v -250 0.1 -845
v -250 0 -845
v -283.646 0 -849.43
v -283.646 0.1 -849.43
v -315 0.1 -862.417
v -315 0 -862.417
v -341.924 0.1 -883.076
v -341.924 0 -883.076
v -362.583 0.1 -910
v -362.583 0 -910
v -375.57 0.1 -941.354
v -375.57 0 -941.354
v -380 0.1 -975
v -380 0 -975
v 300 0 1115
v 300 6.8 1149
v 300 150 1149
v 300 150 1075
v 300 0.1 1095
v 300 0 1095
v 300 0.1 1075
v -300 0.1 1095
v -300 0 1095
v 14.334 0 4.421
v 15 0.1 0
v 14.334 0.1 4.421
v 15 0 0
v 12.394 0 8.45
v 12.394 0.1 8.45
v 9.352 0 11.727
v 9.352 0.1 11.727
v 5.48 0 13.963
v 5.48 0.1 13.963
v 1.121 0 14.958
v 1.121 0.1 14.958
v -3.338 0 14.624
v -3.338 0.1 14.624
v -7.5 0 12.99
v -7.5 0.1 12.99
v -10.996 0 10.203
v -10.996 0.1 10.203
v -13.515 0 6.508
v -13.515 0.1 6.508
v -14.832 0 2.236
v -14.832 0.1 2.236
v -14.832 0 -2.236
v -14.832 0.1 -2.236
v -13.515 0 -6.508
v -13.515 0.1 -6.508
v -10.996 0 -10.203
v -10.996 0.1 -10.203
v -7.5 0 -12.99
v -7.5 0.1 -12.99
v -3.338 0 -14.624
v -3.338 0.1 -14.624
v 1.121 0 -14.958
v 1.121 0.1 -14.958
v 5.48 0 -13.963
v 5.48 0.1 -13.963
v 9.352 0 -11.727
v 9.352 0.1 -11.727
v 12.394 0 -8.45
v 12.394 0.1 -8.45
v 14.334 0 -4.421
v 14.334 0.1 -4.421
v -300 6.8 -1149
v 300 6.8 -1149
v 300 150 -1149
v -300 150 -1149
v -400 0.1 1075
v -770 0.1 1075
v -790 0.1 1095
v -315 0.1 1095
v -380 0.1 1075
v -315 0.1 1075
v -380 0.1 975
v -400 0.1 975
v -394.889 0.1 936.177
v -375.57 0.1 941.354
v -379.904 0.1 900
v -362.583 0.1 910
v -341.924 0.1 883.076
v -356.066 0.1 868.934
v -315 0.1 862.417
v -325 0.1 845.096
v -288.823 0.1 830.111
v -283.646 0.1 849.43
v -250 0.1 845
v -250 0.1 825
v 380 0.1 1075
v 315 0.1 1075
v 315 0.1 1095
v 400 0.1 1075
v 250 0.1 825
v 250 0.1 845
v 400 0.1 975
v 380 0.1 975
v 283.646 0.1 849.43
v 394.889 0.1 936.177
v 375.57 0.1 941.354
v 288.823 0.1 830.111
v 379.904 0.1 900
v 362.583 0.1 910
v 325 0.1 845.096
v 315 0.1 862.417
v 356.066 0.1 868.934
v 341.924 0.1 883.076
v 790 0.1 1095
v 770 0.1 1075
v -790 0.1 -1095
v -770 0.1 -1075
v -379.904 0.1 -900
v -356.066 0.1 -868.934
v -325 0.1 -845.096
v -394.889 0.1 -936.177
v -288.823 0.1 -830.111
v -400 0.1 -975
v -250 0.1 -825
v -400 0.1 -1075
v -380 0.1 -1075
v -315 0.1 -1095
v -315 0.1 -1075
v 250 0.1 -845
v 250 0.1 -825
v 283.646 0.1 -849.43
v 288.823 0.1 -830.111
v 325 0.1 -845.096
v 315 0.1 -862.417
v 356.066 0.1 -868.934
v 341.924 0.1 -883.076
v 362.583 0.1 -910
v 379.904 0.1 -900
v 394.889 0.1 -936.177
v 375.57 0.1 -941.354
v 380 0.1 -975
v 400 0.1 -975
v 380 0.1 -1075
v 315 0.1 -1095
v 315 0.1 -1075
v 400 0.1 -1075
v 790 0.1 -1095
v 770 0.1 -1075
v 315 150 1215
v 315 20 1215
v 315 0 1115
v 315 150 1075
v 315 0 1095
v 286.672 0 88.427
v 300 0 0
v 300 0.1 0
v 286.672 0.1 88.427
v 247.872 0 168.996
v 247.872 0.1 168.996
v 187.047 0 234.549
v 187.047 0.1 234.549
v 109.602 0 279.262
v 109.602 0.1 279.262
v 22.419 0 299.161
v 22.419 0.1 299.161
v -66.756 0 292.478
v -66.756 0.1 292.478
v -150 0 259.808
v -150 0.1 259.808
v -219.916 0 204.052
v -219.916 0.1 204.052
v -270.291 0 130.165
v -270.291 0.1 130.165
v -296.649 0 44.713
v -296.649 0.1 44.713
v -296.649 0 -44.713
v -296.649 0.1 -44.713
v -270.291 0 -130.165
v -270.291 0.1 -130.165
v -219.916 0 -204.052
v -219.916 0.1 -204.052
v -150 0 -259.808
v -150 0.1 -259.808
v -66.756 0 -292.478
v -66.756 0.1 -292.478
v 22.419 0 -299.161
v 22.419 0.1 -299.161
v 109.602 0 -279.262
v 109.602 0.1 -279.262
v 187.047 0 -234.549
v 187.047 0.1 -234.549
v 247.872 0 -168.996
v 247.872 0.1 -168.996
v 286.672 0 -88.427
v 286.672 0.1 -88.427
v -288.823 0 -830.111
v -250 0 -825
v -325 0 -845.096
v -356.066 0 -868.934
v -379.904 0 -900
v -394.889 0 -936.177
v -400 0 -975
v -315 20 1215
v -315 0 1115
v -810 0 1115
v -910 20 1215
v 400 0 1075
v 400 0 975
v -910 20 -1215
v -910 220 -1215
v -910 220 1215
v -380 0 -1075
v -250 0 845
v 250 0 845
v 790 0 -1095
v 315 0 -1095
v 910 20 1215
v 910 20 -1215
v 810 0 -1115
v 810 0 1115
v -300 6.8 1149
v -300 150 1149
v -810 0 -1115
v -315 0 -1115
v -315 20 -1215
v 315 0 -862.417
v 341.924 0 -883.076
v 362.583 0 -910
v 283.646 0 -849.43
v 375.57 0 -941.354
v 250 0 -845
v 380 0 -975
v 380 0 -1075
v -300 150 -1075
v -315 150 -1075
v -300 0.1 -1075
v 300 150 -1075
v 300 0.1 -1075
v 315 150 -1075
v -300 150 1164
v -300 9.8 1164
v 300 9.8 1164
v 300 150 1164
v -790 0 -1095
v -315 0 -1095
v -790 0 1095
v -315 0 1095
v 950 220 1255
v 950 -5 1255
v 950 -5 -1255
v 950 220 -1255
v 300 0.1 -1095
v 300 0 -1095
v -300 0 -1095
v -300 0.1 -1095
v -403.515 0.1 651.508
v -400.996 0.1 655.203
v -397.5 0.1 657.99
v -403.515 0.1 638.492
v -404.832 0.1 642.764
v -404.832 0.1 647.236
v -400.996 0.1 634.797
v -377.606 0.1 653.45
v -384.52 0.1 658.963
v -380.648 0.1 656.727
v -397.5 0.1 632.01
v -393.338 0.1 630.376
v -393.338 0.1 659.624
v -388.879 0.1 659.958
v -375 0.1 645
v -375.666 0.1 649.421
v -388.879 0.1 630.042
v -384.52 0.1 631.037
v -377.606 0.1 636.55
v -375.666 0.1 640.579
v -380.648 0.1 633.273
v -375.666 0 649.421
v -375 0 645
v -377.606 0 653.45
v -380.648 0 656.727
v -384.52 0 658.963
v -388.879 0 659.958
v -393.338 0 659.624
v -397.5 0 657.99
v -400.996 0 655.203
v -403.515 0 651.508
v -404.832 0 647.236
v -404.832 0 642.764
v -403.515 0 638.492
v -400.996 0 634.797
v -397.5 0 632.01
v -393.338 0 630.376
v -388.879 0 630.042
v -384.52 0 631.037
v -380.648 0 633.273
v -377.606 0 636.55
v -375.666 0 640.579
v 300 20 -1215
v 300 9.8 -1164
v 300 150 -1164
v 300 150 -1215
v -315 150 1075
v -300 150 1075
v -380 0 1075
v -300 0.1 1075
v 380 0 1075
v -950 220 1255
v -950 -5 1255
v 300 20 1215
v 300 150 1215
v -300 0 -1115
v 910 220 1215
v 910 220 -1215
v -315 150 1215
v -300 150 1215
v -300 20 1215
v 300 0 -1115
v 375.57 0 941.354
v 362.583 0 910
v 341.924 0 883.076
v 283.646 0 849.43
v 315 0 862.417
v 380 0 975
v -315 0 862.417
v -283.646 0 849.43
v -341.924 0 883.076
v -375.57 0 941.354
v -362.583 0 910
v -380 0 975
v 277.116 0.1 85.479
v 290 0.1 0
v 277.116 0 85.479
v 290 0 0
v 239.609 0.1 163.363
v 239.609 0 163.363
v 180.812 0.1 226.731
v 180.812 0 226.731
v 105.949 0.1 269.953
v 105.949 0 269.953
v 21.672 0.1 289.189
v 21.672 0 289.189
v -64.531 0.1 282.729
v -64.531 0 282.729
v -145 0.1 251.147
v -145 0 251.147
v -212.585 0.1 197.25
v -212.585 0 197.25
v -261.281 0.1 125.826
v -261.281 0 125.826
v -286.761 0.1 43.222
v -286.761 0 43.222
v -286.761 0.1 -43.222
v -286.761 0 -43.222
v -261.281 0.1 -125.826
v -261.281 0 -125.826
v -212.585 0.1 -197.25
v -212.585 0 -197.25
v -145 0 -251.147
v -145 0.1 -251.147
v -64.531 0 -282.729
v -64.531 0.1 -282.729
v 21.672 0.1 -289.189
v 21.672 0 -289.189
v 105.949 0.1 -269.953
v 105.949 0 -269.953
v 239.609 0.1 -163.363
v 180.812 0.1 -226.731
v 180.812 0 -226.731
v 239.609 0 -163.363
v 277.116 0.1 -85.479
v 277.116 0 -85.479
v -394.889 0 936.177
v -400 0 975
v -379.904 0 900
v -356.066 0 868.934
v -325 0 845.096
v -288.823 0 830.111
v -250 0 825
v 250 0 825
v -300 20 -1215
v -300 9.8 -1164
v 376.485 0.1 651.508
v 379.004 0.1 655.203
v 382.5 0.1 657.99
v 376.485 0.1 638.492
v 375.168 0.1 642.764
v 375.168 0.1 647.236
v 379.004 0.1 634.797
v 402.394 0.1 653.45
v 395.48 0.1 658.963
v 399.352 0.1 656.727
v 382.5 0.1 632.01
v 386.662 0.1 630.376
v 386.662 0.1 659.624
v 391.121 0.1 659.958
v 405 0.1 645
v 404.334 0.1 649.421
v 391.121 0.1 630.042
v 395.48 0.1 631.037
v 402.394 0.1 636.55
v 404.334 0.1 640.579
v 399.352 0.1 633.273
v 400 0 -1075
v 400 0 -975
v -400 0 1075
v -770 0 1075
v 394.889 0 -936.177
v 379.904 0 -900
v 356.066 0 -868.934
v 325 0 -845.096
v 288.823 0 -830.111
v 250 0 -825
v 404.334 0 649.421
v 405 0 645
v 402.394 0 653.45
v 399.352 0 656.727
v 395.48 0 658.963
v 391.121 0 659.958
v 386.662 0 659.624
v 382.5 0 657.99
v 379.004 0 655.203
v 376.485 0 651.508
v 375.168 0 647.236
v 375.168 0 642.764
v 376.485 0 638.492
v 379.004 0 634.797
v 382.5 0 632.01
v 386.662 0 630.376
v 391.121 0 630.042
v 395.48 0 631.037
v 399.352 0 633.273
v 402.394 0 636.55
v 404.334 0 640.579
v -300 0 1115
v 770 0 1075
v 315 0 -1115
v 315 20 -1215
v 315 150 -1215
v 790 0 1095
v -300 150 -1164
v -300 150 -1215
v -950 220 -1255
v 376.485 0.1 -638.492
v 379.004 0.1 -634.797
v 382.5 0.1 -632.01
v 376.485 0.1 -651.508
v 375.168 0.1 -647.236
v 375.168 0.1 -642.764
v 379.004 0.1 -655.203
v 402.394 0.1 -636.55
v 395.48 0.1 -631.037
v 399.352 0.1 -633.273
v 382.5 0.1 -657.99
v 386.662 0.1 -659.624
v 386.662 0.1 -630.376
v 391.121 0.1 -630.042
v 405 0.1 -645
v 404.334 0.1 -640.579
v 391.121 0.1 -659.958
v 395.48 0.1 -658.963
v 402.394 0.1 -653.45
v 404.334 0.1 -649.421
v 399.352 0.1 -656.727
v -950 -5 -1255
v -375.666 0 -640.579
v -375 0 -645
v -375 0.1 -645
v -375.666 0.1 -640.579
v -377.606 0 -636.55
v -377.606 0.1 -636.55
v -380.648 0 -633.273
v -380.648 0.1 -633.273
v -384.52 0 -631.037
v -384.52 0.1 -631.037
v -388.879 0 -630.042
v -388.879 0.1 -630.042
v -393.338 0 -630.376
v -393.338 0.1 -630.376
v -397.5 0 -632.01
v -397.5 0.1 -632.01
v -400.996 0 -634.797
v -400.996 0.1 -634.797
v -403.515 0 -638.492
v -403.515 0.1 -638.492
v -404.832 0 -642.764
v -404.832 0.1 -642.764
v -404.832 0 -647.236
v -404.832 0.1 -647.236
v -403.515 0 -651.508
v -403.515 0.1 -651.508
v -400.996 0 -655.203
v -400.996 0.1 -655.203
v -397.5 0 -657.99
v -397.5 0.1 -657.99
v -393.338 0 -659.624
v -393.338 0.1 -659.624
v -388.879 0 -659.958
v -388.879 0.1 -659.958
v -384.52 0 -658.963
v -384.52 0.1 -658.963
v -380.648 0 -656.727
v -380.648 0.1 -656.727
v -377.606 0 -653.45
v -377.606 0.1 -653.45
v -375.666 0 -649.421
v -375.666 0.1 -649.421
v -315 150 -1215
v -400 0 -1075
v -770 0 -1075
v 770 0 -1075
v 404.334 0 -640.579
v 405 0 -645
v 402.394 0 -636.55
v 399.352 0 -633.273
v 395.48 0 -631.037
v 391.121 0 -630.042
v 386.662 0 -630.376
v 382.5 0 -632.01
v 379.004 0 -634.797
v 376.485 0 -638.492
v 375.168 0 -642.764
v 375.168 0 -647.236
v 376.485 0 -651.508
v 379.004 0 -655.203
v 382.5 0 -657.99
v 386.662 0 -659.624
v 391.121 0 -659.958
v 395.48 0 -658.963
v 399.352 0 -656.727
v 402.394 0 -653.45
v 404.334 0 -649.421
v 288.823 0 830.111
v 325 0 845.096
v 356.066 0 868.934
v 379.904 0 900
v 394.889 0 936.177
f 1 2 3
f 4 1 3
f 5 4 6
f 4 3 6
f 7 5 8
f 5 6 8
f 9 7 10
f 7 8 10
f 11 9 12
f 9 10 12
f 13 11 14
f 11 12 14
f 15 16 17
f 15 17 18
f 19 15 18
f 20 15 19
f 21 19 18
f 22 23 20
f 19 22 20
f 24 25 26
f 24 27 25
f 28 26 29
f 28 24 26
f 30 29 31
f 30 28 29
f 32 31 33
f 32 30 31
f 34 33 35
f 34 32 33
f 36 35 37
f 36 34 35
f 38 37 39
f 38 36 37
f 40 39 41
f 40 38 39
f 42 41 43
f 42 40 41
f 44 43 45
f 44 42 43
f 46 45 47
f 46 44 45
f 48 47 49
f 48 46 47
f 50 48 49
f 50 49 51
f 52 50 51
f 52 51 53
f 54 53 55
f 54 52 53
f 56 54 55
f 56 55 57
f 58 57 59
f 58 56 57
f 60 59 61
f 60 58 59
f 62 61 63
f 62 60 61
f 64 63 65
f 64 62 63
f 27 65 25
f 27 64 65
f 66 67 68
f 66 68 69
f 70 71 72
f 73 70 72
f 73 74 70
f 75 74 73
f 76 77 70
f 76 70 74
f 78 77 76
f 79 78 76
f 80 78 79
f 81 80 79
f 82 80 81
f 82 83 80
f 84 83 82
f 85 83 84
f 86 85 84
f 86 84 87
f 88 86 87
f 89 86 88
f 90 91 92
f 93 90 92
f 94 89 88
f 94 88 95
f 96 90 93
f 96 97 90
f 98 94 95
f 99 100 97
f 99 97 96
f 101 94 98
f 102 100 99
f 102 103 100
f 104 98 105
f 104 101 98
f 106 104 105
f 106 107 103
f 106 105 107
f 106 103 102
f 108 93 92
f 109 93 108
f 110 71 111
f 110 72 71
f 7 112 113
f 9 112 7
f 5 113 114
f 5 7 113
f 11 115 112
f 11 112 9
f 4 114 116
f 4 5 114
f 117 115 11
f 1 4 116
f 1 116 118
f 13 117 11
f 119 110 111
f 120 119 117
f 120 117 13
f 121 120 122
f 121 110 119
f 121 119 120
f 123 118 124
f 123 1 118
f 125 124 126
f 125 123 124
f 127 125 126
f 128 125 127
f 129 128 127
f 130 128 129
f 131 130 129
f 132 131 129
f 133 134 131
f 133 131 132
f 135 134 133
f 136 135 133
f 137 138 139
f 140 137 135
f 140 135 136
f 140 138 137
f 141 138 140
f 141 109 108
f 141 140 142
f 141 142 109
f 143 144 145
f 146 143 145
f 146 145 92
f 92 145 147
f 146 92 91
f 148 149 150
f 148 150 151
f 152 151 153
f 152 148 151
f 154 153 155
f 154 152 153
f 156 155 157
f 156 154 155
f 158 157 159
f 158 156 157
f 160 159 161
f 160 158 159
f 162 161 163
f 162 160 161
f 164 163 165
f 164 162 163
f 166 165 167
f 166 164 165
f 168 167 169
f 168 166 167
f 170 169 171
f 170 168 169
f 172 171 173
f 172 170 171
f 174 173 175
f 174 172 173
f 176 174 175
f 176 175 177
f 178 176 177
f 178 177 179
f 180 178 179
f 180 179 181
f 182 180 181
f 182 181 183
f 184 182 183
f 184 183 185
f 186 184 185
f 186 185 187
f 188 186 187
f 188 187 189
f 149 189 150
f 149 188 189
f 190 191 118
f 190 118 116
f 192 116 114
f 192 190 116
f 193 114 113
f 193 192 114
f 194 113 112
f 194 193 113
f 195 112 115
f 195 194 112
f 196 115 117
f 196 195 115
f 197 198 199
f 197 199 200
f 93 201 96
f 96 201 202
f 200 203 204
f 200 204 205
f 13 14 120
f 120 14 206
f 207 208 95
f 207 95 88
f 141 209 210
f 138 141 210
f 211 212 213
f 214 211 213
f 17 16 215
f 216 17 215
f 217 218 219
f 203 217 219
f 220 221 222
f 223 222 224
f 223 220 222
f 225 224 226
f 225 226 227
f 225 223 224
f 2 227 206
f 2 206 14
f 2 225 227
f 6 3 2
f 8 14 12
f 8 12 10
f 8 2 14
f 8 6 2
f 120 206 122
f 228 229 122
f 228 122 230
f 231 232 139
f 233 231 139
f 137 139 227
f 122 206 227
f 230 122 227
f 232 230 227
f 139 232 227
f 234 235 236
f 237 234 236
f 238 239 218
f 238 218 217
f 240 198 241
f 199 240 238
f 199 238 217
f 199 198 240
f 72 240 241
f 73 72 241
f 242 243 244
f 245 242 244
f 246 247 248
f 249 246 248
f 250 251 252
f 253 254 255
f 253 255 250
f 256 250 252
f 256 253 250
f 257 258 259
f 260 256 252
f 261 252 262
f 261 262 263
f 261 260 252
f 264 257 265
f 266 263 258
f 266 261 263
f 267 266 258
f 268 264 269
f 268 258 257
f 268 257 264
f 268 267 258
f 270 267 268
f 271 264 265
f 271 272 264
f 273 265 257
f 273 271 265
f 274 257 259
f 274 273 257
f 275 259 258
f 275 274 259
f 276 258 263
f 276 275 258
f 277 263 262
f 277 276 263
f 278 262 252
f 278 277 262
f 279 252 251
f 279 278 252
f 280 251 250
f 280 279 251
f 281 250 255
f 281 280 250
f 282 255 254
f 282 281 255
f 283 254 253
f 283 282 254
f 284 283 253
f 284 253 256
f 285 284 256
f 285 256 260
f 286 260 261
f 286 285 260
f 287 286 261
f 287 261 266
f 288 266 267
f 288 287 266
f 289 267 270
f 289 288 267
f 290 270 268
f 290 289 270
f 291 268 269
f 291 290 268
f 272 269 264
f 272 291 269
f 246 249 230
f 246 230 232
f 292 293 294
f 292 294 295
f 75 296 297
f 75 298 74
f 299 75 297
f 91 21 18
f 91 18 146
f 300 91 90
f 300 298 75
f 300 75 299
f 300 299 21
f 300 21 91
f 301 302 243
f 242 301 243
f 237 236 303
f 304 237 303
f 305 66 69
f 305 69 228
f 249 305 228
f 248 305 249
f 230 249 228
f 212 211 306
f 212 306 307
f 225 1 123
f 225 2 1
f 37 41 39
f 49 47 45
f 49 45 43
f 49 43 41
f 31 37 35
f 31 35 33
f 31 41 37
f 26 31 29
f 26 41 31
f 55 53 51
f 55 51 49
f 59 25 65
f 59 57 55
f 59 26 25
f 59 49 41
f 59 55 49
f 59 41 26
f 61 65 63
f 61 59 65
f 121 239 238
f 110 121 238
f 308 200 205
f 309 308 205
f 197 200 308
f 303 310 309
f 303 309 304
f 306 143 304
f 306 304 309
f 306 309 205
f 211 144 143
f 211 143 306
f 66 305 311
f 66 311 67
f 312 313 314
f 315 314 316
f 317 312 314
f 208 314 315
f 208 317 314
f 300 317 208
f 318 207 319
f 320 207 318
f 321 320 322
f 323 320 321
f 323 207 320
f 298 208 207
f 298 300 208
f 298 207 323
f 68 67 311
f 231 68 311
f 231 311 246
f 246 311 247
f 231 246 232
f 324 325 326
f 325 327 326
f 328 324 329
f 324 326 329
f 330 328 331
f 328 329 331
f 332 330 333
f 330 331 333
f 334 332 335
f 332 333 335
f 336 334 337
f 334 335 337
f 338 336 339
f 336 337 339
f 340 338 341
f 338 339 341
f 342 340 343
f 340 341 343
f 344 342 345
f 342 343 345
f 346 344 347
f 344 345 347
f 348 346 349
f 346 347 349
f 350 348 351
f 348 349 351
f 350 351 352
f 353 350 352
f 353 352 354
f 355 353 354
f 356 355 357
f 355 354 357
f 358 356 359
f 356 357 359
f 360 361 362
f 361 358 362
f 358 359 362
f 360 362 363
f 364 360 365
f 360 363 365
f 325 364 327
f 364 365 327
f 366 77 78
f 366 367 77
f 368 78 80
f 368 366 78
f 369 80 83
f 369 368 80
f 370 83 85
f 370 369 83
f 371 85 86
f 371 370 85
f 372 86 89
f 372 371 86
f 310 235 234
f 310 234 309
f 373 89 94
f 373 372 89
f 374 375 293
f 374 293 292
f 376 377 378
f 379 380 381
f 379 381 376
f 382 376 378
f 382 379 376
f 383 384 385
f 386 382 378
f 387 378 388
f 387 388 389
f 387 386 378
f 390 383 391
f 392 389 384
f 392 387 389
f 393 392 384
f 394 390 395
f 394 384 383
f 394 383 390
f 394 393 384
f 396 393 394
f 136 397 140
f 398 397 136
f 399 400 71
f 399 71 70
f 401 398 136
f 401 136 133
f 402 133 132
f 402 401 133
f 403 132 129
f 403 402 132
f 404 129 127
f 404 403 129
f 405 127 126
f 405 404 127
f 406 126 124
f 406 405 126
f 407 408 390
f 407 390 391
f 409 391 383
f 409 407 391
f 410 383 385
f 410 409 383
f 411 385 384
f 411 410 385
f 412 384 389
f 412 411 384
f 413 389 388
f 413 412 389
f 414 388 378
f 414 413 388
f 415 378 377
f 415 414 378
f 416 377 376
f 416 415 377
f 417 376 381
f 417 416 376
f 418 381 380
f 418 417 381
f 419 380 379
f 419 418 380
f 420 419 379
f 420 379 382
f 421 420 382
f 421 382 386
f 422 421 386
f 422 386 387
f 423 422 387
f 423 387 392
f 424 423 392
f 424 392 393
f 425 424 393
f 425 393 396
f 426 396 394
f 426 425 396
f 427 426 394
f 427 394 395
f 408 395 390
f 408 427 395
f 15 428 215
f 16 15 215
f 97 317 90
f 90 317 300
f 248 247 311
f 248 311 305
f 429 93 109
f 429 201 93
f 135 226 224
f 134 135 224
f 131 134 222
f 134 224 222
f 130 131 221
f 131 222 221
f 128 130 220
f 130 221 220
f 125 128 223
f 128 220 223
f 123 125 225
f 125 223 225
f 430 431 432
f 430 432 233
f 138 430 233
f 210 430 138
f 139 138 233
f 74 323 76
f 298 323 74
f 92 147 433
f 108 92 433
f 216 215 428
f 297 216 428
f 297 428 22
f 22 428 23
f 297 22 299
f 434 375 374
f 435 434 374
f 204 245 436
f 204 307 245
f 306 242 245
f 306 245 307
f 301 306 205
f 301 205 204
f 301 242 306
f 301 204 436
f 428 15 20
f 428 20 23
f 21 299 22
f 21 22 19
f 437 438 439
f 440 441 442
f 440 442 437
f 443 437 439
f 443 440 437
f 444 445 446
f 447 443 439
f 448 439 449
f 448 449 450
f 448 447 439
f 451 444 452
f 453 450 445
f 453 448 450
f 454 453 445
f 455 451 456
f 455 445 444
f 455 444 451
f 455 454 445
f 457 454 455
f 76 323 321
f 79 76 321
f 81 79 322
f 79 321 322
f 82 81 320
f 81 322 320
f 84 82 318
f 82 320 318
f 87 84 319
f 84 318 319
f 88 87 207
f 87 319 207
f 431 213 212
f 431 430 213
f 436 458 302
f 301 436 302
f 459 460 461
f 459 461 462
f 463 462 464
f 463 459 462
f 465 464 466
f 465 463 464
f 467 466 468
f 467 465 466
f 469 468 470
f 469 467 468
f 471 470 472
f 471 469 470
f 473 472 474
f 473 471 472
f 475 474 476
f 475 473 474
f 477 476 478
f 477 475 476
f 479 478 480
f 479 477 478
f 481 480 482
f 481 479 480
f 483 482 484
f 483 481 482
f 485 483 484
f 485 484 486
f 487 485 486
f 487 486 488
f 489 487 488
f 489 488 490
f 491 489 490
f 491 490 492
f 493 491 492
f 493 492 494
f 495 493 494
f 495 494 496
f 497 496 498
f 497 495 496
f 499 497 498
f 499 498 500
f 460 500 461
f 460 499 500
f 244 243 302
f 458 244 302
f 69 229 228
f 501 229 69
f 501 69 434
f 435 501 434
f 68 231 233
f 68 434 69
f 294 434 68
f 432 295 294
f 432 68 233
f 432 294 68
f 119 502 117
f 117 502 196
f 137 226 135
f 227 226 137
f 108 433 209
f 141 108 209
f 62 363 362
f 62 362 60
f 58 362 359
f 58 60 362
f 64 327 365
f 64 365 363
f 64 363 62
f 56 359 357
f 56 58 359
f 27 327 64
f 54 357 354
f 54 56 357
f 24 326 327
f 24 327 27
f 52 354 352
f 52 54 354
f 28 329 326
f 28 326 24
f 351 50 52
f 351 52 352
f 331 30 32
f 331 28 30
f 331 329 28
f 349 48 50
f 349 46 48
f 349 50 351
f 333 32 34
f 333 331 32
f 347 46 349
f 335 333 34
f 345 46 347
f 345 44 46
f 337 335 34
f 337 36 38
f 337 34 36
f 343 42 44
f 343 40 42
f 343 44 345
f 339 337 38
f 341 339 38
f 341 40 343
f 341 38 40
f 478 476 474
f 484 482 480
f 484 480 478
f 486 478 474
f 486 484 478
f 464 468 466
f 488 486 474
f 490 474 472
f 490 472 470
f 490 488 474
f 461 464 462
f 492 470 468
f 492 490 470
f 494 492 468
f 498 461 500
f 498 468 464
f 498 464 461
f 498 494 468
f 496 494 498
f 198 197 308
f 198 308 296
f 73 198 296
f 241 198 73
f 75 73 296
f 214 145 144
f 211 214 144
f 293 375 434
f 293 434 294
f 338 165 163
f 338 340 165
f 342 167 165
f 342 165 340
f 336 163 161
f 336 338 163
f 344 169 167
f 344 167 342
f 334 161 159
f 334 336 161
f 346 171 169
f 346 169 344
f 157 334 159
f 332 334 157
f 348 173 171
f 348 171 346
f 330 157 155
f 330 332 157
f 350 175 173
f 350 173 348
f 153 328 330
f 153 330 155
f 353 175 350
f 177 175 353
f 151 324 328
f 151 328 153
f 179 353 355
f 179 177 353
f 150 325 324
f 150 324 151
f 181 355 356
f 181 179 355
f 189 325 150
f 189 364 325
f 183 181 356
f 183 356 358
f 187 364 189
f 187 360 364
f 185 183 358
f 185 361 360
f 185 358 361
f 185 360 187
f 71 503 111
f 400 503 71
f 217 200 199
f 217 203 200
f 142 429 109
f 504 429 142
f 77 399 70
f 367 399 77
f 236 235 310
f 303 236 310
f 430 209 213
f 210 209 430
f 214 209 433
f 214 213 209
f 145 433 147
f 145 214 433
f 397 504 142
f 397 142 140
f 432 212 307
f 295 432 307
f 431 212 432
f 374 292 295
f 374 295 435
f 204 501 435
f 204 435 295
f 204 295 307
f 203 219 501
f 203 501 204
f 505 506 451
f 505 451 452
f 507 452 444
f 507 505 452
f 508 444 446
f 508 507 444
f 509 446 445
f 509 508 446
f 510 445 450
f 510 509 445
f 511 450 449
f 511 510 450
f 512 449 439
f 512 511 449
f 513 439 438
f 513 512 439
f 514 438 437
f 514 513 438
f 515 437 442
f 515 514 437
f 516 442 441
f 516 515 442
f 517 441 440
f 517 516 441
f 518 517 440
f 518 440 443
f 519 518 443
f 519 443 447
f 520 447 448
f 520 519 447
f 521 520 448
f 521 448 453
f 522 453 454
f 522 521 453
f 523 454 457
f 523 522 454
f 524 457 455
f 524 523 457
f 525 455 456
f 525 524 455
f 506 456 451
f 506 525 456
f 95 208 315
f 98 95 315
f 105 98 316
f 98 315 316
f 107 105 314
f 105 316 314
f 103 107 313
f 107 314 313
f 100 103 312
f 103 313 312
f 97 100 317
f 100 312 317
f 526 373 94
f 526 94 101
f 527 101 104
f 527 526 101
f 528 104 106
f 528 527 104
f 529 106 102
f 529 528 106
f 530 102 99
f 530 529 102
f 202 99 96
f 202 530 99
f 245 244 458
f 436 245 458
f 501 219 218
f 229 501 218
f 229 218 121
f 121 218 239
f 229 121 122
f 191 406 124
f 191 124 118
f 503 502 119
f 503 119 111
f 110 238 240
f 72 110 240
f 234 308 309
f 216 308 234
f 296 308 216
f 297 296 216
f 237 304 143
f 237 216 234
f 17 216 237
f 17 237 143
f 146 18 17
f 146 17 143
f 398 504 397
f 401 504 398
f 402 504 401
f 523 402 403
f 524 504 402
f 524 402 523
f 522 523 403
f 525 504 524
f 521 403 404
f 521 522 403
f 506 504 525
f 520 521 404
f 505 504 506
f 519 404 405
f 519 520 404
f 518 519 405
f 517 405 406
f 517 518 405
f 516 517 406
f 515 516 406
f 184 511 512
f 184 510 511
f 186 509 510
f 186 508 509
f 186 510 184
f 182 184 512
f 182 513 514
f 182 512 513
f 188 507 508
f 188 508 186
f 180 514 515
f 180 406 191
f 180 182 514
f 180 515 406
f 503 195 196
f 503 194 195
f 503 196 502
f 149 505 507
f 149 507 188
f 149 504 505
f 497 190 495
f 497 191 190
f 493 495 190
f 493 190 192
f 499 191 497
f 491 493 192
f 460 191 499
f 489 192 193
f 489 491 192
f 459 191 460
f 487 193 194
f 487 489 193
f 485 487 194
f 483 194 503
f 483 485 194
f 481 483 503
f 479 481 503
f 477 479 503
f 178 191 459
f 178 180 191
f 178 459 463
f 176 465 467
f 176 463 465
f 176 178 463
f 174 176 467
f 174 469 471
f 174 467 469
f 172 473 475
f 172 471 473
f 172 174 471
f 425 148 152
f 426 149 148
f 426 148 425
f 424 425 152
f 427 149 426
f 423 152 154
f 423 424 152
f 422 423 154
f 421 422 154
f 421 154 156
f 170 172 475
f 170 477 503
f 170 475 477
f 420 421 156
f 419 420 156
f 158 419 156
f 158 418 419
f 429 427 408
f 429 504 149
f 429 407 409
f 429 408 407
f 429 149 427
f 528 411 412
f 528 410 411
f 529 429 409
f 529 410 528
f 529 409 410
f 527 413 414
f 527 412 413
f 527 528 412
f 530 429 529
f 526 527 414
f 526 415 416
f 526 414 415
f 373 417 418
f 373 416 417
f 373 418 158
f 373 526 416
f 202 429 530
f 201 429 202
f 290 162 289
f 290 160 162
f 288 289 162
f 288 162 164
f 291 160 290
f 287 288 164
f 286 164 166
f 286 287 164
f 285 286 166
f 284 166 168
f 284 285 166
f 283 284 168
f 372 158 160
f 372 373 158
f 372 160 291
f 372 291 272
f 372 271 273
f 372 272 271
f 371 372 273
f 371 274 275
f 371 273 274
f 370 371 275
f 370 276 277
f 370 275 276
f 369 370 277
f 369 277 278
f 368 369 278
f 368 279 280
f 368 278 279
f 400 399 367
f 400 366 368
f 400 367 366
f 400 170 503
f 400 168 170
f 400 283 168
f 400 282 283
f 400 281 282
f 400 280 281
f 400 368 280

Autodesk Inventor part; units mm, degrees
ref_plane "YZ Plane" through (0, 0, 0) normal (1, 0, 0) x (0, 1, 0)
ref_plane "XZ Plane" through (0, 0, 0) normal (0, 1, 0) x (-1, 0, 0)
ref_plane "XY Plane" through (0, 0, 0) normal (0, 0, 1) x (1, 0, 0)
sketch "Эскиз1" plane through (0, 0, 0) normal (0, 1, 0) x (-1, 0, 0)
  line L0 (910, 1215) -> (-910, 1215)
  line L1 (-910, 1215) -> (-910, -1215)
  line L2 (-910, -1215) -> (910, -1215)
  line L3 (910, -1215) -> (910, 1215)
  line L4 (0, 0) -> (0, -1215) construction
  line L5 (0, 0) -> (910, 0) construction
  line L6 (950, 1255) -> (-950, 1255)
  line L7 (-950, 1255) -> (-950, -1255)
  line L8 (-950, -1255) -> (950, -1255)
  line L9 (950, -1255) -> (950, 1255)
  dimension "d0" = 2430
  dimension "d1" = 1820
  dimension "d2" = 40
  dimension "d3" = 40
extrude "Выдавливание1" add sketch "Эскиз1" along normal blind 220
extrude "Выдавливание2" add sketch "Эскиз1" against normal blind 5 contours L3 L2 L1 L0 | L9 L8 L7 L6
sketch "Эскиз2" plane through (-910, 220, -1215) normal (0, 0, 1) x (1, 0, 0)
  line L0 (-40, -225) -> (-40, 0) construction
  line L1 (1860, 0) -> (-40, 0) construction
  line L2 (1860, 0) -> (1860, -225) construction
  line L3 (-40, -225) -> (1860, -225) construction
  line L4 (0, -220) -> (0, 0) construction
  line L5 (1860, 0) -> (-40, 0) construction
  line L6 (-40, 0) -> (1860, 0) construction
  line L7 (0, 0) -> (1820, 0) construction
  line L8 (1820, 0) -> (0, 0) construction
  line L9 (0, -220) -> (100, -220)
  line L10 (0, -220) -> (0, -200)
  line L11 (0, -200) -> (100, -220)
  line L12 (1820, -220) -> (1820, 0) construction
  line L13 (910, -220) -> (910, 0) construction
  line L14 (1820, -220) -> (1720, -220)
  line L15 (1820, -220) -> (1820, -200)
  line L16 (1820, -200) -> (1720, -220)
  point P0 (910, -220)
  dimension "d8" = 100
  dimension "d9" = 20
extrude "Выдавливание3" add sketch "Эскиз2" along normal blind 2430
sketch "Эскиз3" plane through (-910, 220, 1215) normal (1, 0, 0) x (0, 0, -1)
  line L0 (2430, -200) -> (2430, 0) construction
  line L1 (0, -200) -> (0, 0) construction
  line L2 (0, -200) -> (2430, -200) construction
  line L3 (2430, -200) -> (2430, 0) construction
  line L4 (0, 0) -> (2430, 0) construction
  line L5 (0, -200) -> (0, 0) construction
  line L6 (1215, -220) -> (1215, 0) construction
  line L7 (2470, 0) -> (-40, 0) projected
  line L8 (0, -220) -> (100, -220)
  line L9 (100, -220) -> (0, -200)
  line L10 (0, -200) -> (0, -220)
  line L11 (2430, -220) -> (2330, -220)
  line L12 (2330, -220) -> (2430, -200)
  line L13 (2430, -200) -> (2430, -220)
  dimension "d14" = 100
  dimension "d15" = 20
extrude "Выдавливание4" add sketch "Эскиз3" along normal blind 1820
sketch "Эскиз4" plane through (0, 0, 0) normal (0, 1, 0) x (1, 0, 0)
  line L0 (-790, -1095) -> (790, -1095)
  line L1 (790, -1095) -> (790, 1095)
  line L2 (790, 1095) -> (-790, 1095)
  line L3 (-790, 1095) -> (-790, -1095)
  line L4 (0, 0) -> (0, 1215) construction
  line L5 (0, 0) -> (-910, 0) construction
  line L6 (810, -1115) -> (910, -1215) construction
  line L7 (-810, -1115) -> (810, -1115) construction
  line L8 (-910, -1215) -> (-810, -1115) construction
  line L9 (910, -1215) -> (-910, -1215) construction
  line L10 (-810, 1115) -> (-910, 1215) construction
  line L11 (-910, -1215) -> (-910, 1215) construction
  line L12 (-910, -1215) -> (-810, -1115) construction
  line L13 (-810, 1115) -> (-810, -1115) construction
  line L14 (910, 1215) -> (810, 1115) construction
  line L15 (-910, 1215) -> (910, 1215) construction
  line L16 (-810, 1115) -> (-910, 1215) construction
  line L17 (810, 1115) -> (-810, 1115) construction
  line L18 (910, 1215) -> (810, 1115) construction
  line L19 (810, -1115) -> (810, 1115) construction
  line L20 (810, -1115) -> (910, -1215) construction
  line L21 (910, 1215) -> (910, -1215) construction
  line L22 (810, 1115) -> (-810, 1115) construction
  line L23 (-810, 1115) -> (-810, -1115) construction
  line L24 (-810, -1115) -> (810, -1115) construction
  line L25 (810, -1115) -> (810, 1115) construction
  line L26 (-770, -1075) -> (770, -1075)
  line L27 (770, -1075) -> (770, 1075)
  line L28 (770, 1075) -> (-770, 1075)
  line L29 (-770, 1075) -> (-770, -1075)
  line L30 (-400, -1075) -> (400, -1075) construction
  line L31 (-400, -1075) -> (-400, -975)
  line L32 (-400, -825) -> (400, -825) construction
  line L33 (400, -825) -> (400, -1075) construction
  arc A0 (-400, -975) -> (-250, -825) centre (-250, -975) ccw construction
  arc A1 (-380, -975) -> (-250, -845) centre (-250, -975) ccw construction
  line L34 (-380, -975) -> (-380, -1075)
  line L35 (-250, -845) -> (0, -845)
  arc A2 (-250, -845) -> (-380, -975) centre (-250, -975) ccw
  arc A3 (-250, -825) -> (-400, -975) centre (-250, -975) ccw
  line L36 (-400, -975) -> (-400, -825) construction
  line L37 (-250, -825) -> (0, -825)
  line L38 (400, -1075) -> (400, -975)
  line L39 (380, -975) -> (380, -1075)
  line L40 (250, -845) -> (0, -845)
  arc A4 (380, -975) -> (250, -845) centre (250, -975) ccw
  arc A5 (400, -975) -> (250, -825) centre (250, -975) ccw
  line L41 (250, -825) -> (0, -825)
  line L42 (-400, 1075) -> (-400, 975)
  line L43 (-380, 975) -> (-380, 1075)
  line L44 (-250, 845) -> (0, 845)
  arc A6 (-380, 975) -> (-250, 845) centre (-250, 975) ccw
  arc A7 (-400, 975) -> (-250, 825) centre (-250, 975) ccw
  line L45 (-250, 825) -> (0, 825)
  line L46 (250, 845) -> (0, 845)
  line L47 (250, 825) -> (0, 825)
  arc A8 (250, 825) -> (400, 975) centre (250, 975) ccw
  arc A9 (250, 845) -> (380, 975) centre (250, 975) ccw
  line L48 (380, 975) -> (380, 1075)
  line L49 (400, 1075) -> (400, 975)
  point P0 (0, -1075)
  dimension "d18" = 120
  dimension "d19" = 120
  dimension "d20" = 20
  dimension "d21" = 20
  dimension "d22" = 800
  dimension "d23" = 250
  dimension "d24" = 300
  dimension "d25" = 20
extrude "Выдавливание5" add sketch "Эскиз4" along normal blind 0.1 contours L3 L2 L1 L0 | L31 A3 L37 L41 A5 L38 L26 L39 A4 L40 L35 A2 L34 | L28 L43 A6 L44 L46 A9 L48 L49 A8 L47 L45 A7 L42
sketch "Эскиз5" plane through (0, 0, 0) normal (0, 1, 0) x (1, 0, 0)
  line L0 (0, 0) -> (-910, 0) construction
  line L1 (0, 0) -> (0, 1215) construction
  circle A0 centre (0, 0) radius 300
  circle A1 centre (0, 0) radius 290
  circle A2 centre (0, 0) radius 15
  line L2 (400, -975) -> (400, -1075) construction
  line L3 (400, -1075) -> (770, -1075) construction
  line L4 (770, -1075) -> (770, 1075) construction
  line L5 (770, 1075) -> (400, 1075) construction
  line L6 (400, 1075) -> (400, 975) construction
  arc A3 (250, 825) -> (400, 975) centre (250, 975) ccw construction
  line L7 (250, 825) -> (-250, 825) construction
  arc A4 (-400, 975) -> (-250, 825) centre (-250, 975) ccw construction
  line L8 (-400, 975) -> (-400, 1075) construction
  line L9 (-400, 1075) -> (-770, 1075) construction
  line L10 (-770, 1075) -> (-770, -1075) construction
  line L11 (-770, -1075) -> (-400, -1075) construction
  line L12 (-400, -1075) -> (-400, -975) construction
  arc A5 (-250, -825) -> (-400, -975) centre (-250, -975) ccw construction
  line L13 (-250, -825) -> (250, -825) construction
  arc A6 (400, -975) -> (250, -825) centre (250, -975) ccw construction
  line L14 (910, 1215) -> (810, 1115) construction
  line L15 (-910, 1215) -> (910, 1215) construction
  line L16 (-810, 1115) -> (-910, 1215) construction
  line L17 (810, 1115) -> (-810, 1115) construction
  line L18 (790, 1095) -> (-790, 1095) construction
  line L19 (-790, 1095) -> (-790, -1095) construction
  line L20 (-790, 1095) -> (790, 1095) construction
  line L21 (-790, 1095) -> (-390, 1095) construction
  line L22 (-390, 1095) -> (-390, 645) construction
  line L23 (-390, 645) -> (-790, 645) construction
  line L24 (-790, 645) -> (-790, 1095) construction
  circle A7 centre (-390, 645) radius 15
  circle A8 centre (-390, -645) radius 15
  circle A9 centre (390, 645) radius 15
  circle A10 centre (390, -645) radius 15
  dimension "d28" = 600
  dimension "d29" = 10
  dimension "d30" = 30
  dimension "d31" = 400
  dimension "d32" = 450
  dimension "d33" = 30
extrude "Выдавливание6" add sketch "Эскиз5" along normal blind 0.1
sketch "Эскиз6" plane through (0, 0, 0) normal (0, 1, 0) x (1, 0, 0)
  line L0 (-380, 1075) -> (-380, 975) construction
  arc A0 (-380, 975) -> (-250, 845) centre (-250, 975) ccw construction
  line L1 (-250, 845) -> (250, 845) construction
  arc A1 (250, 845) -> (380, 975) centre (250, 975) ccw construction
  line L2 (380, 975) -> (380, 1075) construction
  line L3 (380, 1075) -> (-380, 1075) construction
  line L4 (910, 1215) -> (810, 1115) construction
  line L5 (-910, 1215) -> (910, 1215) construction
  line L6 (-810, 1115) -> (-910, 1215) construction
  line L7 (810, 1115) -> (-810, 1115) construction
  line L8 (810, 1115) -> (-810, 1115) construction
  line L9 (-810, 1115) -> (-810, -1115) construction
  line L10 (-810, -1115) -> (810, -1115) construction
  line L11 (810, -1115) -> (810, 1115) construction
  line L12 (-790, -1095) -> (-790, 1095) construction
  line L13 (-790, 1095) -> (790, 1095) construction
  line L14 (790, 1095) -> (790, -1095) construction
  line L15 (790, -1095) -> (-790, -1095) construction
  line L16 (-790, -1095) -> (790, -1095) construction
  line L17 (790, -1095) -> (790, 1095) construction
  line L18 (790, 1095) -> (-790, 1095) construction
  line L19 (-790, 1095) -> (-790, -1095) construction
  arc A2 (400, -975) -> (250, -825) centre (250, -975) ccw construction
  line L20 (250, -825) -> (-250, -825) construction
  arc A3 (-250, -825) -> (-400, -975) centre (-250, -975) ccw construction
  line L21 (-400, -975) -> (-400, -1075) construction
  line L22 (-400, -1075) -> (-770, -1075) construction
  line L23 (-770, -1075) -> (-770, 1075) construction
  line L24 (-770, 1075) -> (-400, 1075) construction
  line L25 (-400, 1075) -> (-400, 975) construction
  arc A4 (-400, 975) -> (-250, 825) centre (-250, 975) ccw construction
  line L26 (-250, 825) -> (250, 825) construction
  arc A5 (250, 825) -> (400, 975) centre (250, 975) ccw construction
  line L27 (400, 975) -> (400, 1075) construction
  line L28 (400, 1075) -> (770, 1075) construction
  line L29 (770, 1075) -> (770, -1075) construction
  line L30 (770, -1075) -> (400, -1075) construction
  line L31 (400, -1075) -> (400, -975) construction
  line L32 (-380, 1075) -> (380, 1075) construction
  line L33 (380, 1075) -> (380, 975) construction
  arc A6 (250, 845) -> (380, 975) centre (250, 975) ccw construction
  line L34 (250, 845) -> (-250, 845) construction
  arc A7 (-380, 975) -> (-250, 845) centre (-250, 975) ccw construction
  line L35 (-380, 975) -> (-380, 1075) construction
  arc A8 (380, -975) -> (250, -845) centre (250, -975) ccw construction
  line L36 (380, -975) -> (380, -1075) construction
  line L37 (380, -1075) -> (-380, -1075) construction
  line L38 (-380, -1075) -> (-380, -975) construction
  arc A9 (-250, -845) -> (-380, -975) centre (-250, -975) ccw construction
  line L39 (-250, -845) -> (250, -845) construction
  line L40 (950, 1255) -> (-950, 1255) construction
  line L41 (-950, 1255) -> (-950, -1255) construction
  line L42 (-950, -1255) -> (950, -1255) construction
  line L43 (950, -1255) -> (950, 1255) construction
  line L44 (-910, -1215) -> (-910, 1215) construction
  line L45 (-910, 1215) -> (910, 1215) construction
  line L46 (910, 1215) -> (910, -1215) construction
  line L47 (910, -1215) -> (-910, -1215) construction
  line L48 (0, 0) -> (0, 1215) construction
  line L49 (400, -975) -> (400, -1075) construction
  line L50 (400, -1075) -> (770, -1075) construction
  line L51 (770, -1075) -> (770, 1075) construction
  line L52 (770, 1075) -> (400, 1075) construction
  line L53 (400, 1075) -> (400, 975) construction
  arc A10 (250, 825) -> (400, 975) centre (250, 975) ccw construction
  line L54 (250, 825) -> (-250, 825) construction
  arc A11 (-400, 975) -> (-250, 825) centre (-250, 975) ccw construction
  line L55 (-400, 975) -> (-400, 1075) construction
  line L56 (-400, 1075) -> (-770, 1075) construction
  line L57 (-770, 1075) -> (-770, -1075) construction
  line L58 (-770, -1075) -> (-400, -1075) construction
  line L59 (-400, -1075) -> (-400, -975) construction
  arc A12 (-250, -825) -> (-400, -975) centre (-250, -975) ccw construction
  line L60 (-250, -825) -> (250, -825) construction
  arc A13 (400, -975) -> (250, -825) centre (250, -975) ccw construction
  circle A14 centre (-390, -645) radius 15 construction
  circle A15 centre (390, 645) radius 15 construction
  circle A16 centre (390, -645) radius 15 construction
  circle A17 centre (-390, 645) radius 15 construction
  circle A18 centre (0, 0) radius 300 construction
  line L61 (0, 0) -> (-910, 0) construction
  line L62 (-910, 1215) -> (910, 1215) construction
  line L63 (-300, 1215) -> (300, 1215) construction
  line L64 (300, 1215) -> (300, 1149) construction
  line L65 (300, 1149) -> (-300, 1149)
  line L66 (-300, 1149) -> (-300, 1215) construction
  line L67 (-300, 1149) -> (-300, 1075)
  line L68 (380, 1075) -> (-380, 1075) construction
  line L69 (300, 1149) -> (300, 1075)
  line L70 (-300, 1164) -> (300, 1164)
  line L71 (-300, 1164) -> (-300, 1215)
  line L72 (300, 1164) -> (300, 1215)
  line L73 (-315, 1215) -> (-315, 1075)
  line L74 (-315, 1075) -> (-300, 1075)
  line L75 (-315, 1215) -> (-300, 1215)
  line L76 (315, 1215) -> (315, 1075)
  line L77 (300, 1075) -> (315, 1075)
  line L78 (300, 1215) -> (315, 1215)
  line L79 (300, -1149) -> (-300, -1149)
  line L80 (-300, -1149) -> (-300, -1075)
  line L81 (300, -1149) -> (300, -1075)
  line L82 (-300, -1164) -> (300, -1164)
  line L83 (-300, -1164) -> (-300, -1215)
  line L84 (300, -1164) -> (300, -1215)
  line L85 (-315, -1215) -> (-315, -1075)
  line L86 (-315, -1075) -> (-300, -1075)
  line L87 (-315, -1215) -> (-300, -1215)
  line L88 (315, -1215) -> (315, -1075)
  line L89 (300, -1075) -> (315, -1075)
  line L90 (300, -1215) -> (315, -1215)
  dimension "d36" = 600
  dimension "d38" = 74
  dimension "d39" = 15
  dimension "d40" = 15
  dimension "d41" = 15
extrude "Выдавливание7" add sketch "Эскиз6" along normal blind 150
properties part number "field"
